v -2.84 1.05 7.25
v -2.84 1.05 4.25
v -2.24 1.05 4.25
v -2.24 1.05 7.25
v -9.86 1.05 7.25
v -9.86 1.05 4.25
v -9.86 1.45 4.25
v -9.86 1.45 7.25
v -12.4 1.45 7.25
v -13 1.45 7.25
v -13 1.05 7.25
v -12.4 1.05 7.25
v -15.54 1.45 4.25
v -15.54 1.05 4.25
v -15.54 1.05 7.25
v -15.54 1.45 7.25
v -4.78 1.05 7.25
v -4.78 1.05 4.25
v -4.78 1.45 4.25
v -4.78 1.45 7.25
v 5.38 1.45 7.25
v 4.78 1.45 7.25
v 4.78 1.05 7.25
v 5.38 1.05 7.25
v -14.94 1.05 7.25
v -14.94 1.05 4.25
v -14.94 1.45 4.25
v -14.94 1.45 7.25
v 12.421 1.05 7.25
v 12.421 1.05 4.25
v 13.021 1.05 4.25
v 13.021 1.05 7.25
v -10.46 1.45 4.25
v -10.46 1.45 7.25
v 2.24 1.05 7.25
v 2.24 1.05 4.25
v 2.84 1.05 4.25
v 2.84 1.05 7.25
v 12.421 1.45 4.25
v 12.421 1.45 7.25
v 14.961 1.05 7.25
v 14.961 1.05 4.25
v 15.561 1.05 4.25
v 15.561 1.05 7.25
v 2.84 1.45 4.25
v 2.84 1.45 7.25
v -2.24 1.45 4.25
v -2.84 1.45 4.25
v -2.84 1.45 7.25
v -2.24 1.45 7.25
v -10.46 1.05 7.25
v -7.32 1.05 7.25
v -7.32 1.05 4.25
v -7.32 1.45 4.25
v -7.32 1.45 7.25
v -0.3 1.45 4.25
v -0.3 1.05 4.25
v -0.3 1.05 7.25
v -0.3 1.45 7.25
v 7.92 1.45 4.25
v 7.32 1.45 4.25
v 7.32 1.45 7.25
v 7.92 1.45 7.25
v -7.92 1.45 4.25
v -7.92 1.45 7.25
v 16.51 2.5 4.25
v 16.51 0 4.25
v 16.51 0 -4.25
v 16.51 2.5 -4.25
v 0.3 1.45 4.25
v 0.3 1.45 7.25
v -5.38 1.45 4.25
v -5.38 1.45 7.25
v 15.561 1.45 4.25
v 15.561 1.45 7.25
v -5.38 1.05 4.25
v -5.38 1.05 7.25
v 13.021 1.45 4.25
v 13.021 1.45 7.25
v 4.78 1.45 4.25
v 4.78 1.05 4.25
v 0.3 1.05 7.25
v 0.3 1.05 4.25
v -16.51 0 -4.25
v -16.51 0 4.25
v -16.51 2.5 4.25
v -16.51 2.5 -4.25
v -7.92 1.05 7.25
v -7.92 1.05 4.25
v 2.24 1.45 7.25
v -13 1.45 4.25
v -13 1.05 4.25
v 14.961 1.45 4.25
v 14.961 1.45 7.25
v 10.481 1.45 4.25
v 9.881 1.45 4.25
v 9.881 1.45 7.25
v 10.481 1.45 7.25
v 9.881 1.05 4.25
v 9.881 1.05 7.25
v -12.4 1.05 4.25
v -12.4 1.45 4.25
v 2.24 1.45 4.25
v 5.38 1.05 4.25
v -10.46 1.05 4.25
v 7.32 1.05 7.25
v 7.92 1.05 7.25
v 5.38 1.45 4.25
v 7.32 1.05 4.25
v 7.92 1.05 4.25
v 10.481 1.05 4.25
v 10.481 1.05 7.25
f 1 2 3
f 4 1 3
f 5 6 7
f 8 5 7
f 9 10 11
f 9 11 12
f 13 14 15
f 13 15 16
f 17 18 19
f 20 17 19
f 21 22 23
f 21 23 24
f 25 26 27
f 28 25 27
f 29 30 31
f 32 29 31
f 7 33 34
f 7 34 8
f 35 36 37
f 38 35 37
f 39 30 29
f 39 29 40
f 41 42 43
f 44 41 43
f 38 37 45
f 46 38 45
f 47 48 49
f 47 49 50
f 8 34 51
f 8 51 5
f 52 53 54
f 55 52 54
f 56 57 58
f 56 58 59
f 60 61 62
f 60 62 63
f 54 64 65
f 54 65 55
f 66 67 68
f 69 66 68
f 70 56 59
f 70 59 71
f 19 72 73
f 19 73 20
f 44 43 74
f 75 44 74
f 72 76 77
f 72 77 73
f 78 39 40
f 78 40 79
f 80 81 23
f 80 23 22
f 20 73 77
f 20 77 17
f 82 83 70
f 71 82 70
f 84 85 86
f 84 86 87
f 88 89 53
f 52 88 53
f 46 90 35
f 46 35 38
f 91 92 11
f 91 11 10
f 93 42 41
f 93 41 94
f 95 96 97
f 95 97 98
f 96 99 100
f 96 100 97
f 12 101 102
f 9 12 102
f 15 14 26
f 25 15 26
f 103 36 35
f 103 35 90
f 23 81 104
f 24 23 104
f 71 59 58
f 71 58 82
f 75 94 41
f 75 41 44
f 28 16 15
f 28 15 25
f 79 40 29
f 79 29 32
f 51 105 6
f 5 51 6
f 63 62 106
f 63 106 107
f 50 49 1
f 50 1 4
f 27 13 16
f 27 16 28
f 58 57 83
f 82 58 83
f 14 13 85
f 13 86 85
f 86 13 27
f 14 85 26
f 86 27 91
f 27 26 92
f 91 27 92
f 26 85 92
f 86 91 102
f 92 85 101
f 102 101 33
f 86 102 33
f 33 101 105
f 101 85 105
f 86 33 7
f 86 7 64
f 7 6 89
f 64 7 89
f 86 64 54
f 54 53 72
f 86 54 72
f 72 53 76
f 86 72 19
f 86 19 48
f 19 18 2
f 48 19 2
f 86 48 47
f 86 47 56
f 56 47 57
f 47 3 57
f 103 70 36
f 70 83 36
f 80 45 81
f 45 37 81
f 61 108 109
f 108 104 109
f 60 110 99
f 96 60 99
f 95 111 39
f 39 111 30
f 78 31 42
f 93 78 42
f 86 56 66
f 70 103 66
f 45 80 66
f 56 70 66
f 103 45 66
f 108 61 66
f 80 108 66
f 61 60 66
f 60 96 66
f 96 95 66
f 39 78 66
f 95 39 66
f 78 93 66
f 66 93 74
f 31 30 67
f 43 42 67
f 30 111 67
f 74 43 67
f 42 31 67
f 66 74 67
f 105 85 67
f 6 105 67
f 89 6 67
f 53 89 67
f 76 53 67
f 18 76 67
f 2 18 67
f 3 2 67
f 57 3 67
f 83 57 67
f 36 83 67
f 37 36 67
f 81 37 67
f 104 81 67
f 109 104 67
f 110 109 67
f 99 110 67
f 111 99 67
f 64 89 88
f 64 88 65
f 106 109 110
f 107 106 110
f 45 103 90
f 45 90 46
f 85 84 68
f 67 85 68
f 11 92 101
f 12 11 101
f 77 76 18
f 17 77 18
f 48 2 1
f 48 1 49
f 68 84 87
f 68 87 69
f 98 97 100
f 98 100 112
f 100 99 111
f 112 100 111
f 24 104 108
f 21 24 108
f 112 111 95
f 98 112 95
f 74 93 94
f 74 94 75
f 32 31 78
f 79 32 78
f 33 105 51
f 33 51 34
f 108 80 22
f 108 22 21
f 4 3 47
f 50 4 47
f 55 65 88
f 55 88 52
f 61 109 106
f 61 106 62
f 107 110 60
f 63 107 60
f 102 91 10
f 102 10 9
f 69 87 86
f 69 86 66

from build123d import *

# Parameters (mm, degrees)
SKETCH_1_W      = 33.02
SKETCH_1_H      = 8.5
EXTRUDE_1_DEPTH = 2.5
SKETCH_2_W      = 0.6
SKETCH_2_H      = 0.4
EXTRUDE_2_DEPTH = 3


with BuildPart() as part:
    # Эскиз1 → Бобышка-Вытянуть1 (new body)
    with BuildSketch(Plane(origin=(0, 0, 0), x_dir=(1, 0, 0), z_dir=(0, 1, 0))):
        Rectangle(SKETCH_1_W, SKETCH_1_H)
    extrude(amount=EXTRUDE_1_DEPTH)

    # Эскиз2 → Бобышка-Вытянуть2 (add)
    with BuildSketch(Plane.XY.offset(4.25)):
        with Locations((-7.62, 1.25)):
            Rectangle(SKETCH_2_W, SKETCH_2_H)
        with Locations((-10.16, 1.25)):
            Rectangle(SKETCH_2_W, SKETCH_2_H)
        with Locations((-5.08, 1.25)):
            Rectangle(SKETCH_2_W, SKETCH_2_H)
        with Locations((-2.54, 1.25)):
            Rectangle(SKETCH_2_W, SKETCH_2_H)
        with Locations((0, 1.25)):
            Rectangle(SKETCH_2_W, SKETCH_2_H)
        with Locations((2.54, 1.25)):
            Rectangle(SKETCH_2_W, SKETCH_2_H)
        with Locations((5.08, 1.25)):
            Rectangle(SKETCH_2_W, SKETCH_2_H)
        with Locations((7.62, 1.25)):
            Rectangle(SKETCH_2_W, SKETCH_2_H)
        with Locations((10.180976984, 1.25)):
            Rectangle(SKETCH_2_W, SKETCH_2_H)
        with Locations((12.720976984, 1.25)):
            Rectangle(SKETCH_2_W, SKETCH_2_H)
        with Locations((15.260976984, 1.25)):
            Rectangle(SKETCH_2_W, SKETCH_2_H)
        with Locations((-12.7, 1.25)):
            Rectangle(SKETCH_2_W, SKETCH_2_H)
        with Locations((-15.24, 1.25)):
            Rectangle(SKETCH_2_W, SKETCH_2_H)
    extrude(amount=EXTRUDE_2_DEPTH)


solid = part.part
